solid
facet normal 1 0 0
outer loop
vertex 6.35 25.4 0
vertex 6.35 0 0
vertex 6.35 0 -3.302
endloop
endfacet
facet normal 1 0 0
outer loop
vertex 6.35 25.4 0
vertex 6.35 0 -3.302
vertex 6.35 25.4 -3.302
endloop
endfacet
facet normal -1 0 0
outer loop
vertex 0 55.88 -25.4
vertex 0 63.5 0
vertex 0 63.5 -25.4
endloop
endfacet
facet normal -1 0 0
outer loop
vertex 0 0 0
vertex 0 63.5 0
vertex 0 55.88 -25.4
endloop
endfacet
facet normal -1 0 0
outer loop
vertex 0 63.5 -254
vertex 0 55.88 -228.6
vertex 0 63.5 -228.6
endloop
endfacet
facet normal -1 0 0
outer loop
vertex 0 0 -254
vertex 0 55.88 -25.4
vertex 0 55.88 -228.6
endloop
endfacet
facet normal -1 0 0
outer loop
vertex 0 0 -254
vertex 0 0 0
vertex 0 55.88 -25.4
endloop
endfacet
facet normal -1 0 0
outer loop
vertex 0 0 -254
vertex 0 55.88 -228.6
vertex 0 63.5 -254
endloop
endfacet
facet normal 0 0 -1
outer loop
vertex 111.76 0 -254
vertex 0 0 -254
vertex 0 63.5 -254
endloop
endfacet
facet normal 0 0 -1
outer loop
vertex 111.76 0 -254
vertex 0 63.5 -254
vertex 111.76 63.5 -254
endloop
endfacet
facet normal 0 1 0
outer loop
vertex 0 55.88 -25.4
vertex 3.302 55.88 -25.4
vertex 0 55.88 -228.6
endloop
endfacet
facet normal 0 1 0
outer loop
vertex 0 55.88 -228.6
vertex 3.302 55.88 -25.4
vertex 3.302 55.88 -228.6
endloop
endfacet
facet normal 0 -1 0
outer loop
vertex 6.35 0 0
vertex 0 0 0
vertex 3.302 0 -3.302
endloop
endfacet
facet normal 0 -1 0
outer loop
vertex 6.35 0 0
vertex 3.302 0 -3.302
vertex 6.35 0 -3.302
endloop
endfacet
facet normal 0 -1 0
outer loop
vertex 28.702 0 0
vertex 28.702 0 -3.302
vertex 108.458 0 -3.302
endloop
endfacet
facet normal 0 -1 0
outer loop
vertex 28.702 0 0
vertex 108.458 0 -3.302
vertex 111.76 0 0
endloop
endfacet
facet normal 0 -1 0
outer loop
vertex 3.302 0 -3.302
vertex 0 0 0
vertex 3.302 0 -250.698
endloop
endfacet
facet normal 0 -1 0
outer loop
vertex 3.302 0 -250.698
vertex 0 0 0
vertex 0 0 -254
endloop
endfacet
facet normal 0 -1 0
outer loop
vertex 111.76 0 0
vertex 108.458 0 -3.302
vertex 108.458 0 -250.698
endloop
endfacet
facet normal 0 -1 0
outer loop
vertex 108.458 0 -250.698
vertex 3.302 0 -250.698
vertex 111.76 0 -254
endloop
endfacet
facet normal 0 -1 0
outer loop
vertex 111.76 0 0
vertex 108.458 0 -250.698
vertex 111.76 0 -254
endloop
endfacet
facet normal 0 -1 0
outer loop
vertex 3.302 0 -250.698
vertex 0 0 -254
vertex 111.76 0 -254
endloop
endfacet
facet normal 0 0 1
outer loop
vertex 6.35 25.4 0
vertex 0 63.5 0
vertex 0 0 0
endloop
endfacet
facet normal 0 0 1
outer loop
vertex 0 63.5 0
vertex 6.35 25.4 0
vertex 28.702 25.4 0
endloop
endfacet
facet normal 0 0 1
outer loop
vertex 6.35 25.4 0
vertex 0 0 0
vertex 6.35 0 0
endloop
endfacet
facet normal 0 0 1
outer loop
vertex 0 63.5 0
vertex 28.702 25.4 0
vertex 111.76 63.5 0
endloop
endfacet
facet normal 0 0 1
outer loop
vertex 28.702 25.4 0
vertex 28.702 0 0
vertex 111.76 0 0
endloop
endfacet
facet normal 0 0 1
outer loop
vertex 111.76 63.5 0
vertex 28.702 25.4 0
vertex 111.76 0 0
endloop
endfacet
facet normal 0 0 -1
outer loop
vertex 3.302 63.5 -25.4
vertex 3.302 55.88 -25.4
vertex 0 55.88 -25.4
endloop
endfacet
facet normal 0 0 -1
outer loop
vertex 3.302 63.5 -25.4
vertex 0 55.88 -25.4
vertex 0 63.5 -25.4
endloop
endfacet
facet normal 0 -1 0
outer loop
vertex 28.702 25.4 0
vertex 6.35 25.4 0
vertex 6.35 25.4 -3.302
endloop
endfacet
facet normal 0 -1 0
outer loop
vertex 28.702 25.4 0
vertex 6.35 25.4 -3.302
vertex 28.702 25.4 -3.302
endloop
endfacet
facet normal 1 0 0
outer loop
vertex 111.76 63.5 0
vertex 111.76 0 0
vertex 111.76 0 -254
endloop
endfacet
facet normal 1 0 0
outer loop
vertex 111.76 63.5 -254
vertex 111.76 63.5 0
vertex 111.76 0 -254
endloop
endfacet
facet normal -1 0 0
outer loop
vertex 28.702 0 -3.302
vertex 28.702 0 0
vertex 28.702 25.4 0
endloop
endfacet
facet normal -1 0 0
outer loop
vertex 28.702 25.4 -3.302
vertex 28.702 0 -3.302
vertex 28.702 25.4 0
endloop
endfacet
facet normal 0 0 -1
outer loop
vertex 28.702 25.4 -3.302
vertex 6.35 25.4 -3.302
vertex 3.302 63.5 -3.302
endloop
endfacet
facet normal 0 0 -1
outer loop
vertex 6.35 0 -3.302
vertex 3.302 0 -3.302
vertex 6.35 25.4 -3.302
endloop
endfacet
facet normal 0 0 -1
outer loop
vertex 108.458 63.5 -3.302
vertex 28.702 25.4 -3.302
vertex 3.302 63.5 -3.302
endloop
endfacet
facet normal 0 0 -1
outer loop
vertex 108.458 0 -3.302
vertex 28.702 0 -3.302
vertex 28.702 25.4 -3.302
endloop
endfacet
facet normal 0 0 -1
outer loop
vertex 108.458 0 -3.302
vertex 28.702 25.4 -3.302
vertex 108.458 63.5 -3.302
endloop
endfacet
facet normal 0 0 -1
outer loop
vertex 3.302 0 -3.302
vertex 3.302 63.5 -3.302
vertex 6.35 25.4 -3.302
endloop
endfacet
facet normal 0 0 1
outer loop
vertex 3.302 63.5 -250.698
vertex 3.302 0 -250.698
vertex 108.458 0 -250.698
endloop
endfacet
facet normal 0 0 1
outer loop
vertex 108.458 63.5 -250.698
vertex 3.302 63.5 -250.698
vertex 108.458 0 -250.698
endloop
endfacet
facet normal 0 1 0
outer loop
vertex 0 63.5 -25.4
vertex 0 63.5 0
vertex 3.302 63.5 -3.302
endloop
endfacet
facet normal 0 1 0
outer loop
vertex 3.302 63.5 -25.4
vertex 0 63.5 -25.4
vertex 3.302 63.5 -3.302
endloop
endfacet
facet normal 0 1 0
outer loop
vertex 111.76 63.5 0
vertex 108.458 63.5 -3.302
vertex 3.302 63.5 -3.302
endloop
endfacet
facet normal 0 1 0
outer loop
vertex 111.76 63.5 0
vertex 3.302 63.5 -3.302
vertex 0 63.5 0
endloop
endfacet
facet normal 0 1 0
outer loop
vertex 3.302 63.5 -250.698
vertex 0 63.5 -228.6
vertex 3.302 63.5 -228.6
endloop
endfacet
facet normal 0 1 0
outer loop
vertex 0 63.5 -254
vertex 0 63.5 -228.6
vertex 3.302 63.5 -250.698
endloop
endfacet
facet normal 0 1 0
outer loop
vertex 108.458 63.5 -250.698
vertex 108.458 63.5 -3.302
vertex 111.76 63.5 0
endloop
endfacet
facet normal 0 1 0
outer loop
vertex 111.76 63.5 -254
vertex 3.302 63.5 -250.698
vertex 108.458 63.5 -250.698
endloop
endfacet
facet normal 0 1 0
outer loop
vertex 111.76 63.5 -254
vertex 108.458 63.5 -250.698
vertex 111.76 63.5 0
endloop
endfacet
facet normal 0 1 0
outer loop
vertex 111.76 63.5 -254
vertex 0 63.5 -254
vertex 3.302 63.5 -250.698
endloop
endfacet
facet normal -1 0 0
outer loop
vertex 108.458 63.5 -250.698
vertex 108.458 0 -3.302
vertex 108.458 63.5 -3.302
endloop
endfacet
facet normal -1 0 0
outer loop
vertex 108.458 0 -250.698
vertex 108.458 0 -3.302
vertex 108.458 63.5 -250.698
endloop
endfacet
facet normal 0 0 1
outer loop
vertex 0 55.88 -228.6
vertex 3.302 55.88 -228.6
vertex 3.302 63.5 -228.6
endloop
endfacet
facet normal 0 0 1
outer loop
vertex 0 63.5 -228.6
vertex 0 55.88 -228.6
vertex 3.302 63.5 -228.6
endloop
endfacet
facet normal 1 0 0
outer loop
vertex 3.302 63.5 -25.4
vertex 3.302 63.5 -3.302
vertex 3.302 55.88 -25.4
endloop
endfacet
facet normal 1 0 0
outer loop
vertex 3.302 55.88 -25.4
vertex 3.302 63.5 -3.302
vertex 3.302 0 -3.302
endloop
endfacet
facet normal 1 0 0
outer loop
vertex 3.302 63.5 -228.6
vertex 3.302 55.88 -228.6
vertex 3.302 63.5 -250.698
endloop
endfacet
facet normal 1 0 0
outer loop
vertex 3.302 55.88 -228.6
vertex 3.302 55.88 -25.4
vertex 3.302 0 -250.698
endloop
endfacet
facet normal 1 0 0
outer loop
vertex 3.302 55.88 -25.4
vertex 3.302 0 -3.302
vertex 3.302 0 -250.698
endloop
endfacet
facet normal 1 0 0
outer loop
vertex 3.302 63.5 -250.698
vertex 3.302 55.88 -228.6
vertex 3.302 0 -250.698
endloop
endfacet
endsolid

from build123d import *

# Parameters (mm, degrees)
SKETCH2_W           = 111.76
SKETCH2_H           = 254
SKETCH2_W_2         = 105.156
SKETCH2_H_2         = 247.396
BOSS_EXTRUDE2_DEPTH = 63.5
SKETCH3_W           = 203.2
SKETCH3_H           = 7.62
CUT_EXTRUDE1_DEPTH  = 63.5
CUT_EXTRUDE2_REACH  = 256
SKETCH4_W           = 22.352
SKETCH4_H           = 25.4


with BuildPart() as part:
    # Sketch2 → Boss-Extrude2 (new body)
    with BuildSketch(Plane(origin=(0, 0, 0), x_dir=(1, 0, 0), z_dir=(0, 1, 0))):
        with Locations((55.88, 127)):
            Rectangle(SKETCH2_W, SKETCH2_H)
        with Locations((55.88, 127)):
            Rectangle(SKETCH2_W_2, SKETCH2_H_2, mode=Mode.SUBTRACT)
    extrude(amount=BOSS_EXTRUDE2_DEPTH)

    # Sketch3 → Cut-Extrude1 (cut)
    with BuildSketch(Plane(origin=(3.302, 0, 0), x_dir=(0, 0, -1), z_dir=(1, 0, 0))):
        with Locations((127, 59.69)):
            Rectangle(SKETCH3_W, SKETCH3_H)
    extrude(amount=-CUT_EXTRUDE1_DEPTH, mode=Mode.SUBTRACT)

    # Sketch4 → Cut-Extrude2 (cut, up to next)
    with BuildSketch(Plane.XY, mode=Mode.PRIVATE) as cut_extrude2_sk1:
        with Locations((17.526, 12.7)):
            Rectangle(SKETCH4_W, SKETCH4_H)
    cut_extrude2_tool1 = extrude(cut_extrude2_sk1.sketch, amount=-CUT_EXTRUDE2_REACH, mode=Mode.PRIVATE) & part.part
    add(cut_extrude2_tool1.solids().sort_by_distance((17.526, 12.7, 0))[0], mode=Mode.SUBTRACT)


solid = part.part
